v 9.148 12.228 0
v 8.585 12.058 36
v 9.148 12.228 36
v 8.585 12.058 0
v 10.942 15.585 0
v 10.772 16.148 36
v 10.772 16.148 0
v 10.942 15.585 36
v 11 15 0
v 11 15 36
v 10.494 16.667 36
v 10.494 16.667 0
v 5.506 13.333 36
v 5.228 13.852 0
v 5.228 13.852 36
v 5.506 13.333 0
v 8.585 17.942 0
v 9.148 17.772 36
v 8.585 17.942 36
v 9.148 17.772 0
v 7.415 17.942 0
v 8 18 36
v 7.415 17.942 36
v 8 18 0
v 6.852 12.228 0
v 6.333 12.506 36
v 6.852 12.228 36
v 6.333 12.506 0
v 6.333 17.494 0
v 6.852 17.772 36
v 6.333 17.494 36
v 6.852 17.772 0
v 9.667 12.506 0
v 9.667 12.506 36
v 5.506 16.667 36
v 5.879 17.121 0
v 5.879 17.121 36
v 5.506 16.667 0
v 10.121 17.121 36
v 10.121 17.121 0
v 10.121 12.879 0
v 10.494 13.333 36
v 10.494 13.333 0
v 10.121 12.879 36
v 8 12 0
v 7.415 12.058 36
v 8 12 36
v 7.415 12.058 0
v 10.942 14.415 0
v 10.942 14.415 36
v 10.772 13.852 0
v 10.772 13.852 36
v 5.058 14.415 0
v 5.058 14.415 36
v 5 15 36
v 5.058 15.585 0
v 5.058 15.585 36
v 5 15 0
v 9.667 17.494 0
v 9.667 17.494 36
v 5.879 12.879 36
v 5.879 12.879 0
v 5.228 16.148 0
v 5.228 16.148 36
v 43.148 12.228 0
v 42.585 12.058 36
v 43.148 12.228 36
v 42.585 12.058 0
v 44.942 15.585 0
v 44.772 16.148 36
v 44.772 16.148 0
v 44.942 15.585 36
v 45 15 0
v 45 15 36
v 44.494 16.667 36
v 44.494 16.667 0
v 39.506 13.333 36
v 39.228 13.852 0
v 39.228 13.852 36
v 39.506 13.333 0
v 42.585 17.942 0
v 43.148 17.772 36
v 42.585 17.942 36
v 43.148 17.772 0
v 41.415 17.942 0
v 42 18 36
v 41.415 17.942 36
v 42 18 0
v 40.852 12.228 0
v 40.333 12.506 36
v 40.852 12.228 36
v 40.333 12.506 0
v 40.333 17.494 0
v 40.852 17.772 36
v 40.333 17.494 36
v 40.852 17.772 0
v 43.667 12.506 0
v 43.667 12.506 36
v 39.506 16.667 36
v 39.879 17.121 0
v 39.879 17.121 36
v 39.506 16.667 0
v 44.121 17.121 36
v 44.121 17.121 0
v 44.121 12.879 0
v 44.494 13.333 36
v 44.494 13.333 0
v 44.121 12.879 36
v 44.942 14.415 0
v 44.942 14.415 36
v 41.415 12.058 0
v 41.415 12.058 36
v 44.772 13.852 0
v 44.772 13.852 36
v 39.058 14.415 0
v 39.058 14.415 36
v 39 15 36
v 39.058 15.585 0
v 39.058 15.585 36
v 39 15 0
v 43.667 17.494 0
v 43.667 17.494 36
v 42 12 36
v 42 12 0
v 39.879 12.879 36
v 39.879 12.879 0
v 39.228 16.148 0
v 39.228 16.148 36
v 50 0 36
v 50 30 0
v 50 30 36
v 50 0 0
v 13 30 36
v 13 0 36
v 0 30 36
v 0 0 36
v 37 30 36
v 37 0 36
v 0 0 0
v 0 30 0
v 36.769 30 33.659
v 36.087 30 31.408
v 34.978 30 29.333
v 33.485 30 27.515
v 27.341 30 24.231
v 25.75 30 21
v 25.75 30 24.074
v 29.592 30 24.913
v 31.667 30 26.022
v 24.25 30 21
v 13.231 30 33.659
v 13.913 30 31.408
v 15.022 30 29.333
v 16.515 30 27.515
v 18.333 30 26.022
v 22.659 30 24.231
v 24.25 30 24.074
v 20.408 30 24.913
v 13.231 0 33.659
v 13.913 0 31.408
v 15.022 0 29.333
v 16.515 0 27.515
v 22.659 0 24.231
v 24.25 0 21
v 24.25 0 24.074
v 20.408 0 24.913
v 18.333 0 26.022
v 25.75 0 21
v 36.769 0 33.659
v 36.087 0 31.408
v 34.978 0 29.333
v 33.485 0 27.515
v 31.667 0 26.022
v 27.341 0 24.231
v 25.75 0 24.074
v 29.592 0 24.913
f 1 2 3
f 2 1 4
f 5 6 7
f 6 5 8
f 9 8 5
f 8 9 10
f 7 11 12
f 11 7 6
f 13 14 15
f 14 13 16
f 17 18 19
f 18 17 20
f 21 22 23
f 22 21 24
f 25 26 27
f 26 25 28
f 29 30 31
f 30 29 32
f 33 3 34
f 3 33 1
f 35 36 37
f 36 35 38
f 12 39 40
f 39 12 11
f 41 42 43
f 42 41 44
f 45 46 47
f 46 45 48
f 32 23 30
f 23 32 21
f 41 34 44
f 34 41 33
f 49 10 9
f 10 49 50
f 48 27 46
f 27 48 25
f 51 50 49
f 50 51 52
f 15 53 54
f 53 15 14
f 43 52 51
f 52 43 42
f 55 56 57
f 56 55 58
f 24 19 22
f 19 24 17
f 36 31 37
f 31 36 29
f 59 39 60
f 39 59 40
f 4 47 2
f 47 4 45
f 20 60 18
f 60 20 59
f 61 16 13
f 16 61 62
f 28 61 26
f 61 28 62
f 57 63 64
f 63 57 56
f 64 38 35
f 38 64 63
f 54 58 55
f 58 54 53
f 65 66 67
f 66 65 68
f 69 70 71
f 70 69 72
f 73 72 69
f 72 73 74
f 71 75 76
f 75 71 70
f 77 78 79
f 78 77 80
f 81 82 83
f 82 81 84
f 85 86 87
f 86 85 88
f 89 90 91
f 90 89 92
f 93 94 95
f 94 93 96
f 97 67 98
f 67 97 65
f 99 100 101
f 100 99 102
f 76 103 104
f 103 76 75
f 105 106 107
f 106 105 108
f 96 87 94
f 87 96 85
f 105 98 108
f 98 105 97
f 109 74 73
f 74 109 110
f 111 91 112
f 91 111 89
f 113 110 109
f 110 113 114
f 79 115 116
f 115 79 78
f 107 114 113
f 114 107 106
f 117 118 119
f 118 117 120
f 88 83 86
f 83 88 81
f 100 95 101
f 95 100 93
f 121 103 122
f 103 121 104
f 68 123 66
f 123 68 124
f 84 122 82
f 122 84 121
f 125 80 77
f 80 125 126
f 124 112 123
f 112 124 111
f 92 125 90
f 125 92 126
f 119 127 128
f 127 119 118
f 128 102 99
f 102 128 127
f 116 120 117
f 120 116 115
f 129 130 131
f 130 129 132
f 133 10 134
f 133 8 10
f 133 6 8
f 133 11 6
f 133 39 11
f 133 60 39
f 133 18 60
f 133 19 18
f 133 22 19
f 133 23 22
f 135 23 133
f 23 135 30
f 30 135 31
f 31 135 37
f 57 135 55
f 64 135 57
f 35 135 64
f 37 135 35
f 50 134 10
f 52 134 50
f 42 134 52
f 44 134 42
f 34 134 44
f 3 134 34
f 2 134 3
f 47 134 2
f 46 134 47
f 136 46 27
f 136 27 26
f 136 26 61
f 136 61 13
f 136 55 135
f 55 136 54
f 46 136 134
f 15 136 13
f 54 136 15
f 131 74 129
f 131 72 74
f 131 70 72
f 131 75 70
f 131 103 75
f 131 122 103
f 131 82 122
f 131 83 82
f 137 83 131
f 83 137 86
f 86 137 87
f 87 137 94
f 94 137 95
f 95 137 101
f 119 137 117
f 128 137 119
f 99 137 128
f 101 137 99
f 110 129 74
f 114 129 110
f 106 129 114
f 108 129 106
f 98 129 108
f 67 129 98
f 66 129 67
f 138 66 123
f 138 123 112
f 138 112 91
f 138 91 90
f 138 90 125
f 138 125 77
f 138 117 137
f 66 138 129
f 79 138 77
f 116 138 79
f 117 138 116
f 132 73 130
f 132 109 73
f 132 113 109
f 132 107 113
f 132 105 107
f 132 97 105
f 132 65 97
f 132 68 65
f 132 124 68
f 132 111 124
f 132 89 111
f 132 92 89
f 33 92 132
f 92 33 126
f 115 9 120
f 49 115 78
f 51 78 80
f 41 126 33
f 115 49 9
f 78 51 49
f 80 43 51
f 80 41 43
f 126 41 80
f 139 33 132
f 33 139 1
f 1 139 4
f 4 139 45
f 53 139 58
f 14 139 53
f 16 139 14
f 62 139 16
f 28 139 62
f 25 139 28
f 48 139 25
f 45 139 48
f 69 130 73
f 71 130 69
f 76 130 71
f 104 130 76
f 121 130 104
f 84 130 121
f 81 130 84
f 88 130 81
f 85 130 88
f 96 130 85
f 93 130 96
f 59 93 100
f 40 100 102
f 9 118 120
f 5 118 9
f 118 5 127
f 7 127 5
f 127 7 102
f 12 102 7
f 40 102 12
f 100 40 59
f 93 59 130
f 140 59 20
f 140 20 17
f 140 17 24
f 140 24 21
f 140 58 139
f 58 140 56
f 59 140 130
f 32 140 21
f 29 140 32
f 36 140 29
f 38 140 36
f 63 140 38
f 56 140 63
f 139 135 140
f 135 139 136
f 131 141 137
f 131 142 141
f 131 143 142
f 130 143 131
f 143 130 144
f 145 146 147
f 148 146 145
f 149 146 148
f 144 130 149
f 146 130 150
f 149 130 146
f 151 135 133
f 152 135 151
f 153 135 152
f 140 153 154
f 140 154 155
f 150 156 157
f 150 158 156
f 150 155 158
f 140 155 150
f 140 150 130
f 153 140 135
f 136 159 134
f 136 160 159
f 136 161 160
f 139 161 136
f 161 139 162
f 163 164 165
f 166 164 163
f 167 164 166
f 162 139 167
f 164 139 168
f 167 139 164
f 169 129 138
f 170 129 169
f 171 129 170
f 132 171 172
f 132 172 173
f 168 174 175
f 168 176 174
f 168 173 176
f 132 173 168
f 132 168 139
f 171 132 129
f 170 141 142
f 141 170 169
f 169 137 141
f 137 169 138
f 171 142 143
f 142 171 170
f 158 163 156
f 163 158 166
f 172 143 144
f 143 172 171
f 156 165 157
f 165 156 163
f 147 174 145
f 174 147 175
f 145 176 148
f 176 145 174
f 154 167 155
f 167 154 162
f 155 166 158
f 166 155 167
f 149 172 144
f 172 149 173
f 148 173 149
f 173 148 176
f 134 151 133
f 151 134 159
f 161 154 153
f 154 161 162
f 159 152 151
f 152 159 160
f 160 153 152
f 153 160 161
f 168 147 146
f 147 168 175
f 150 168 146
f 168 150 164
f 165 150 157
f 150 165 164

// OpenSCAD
$fn = 32;

// ----------------------------------------------------------------------
// Saddle clamp: split shaft clamp
// ----------------------------------------------------------------------

// --- parameters (mm) ---
blk_l = 50;               // block length, X
blk_w = 30;               // block width, Y
blk_h = 36;               // block height
clamp_r = 12;             // shaft groove radius
hole_r = 3;               // bolt hole radius
hole_m = 8;               // bolt hole margin from the ends
saw_w = 1.5;              // saw kerf width
fit_tol = 0.1;            // tolerance for press fits, mm
free_tol = 0.5;           // tolerance for clearance fits, mm

saw_depth = clamp_r + 3;  // saw kerf depth

difference() {
  cube([blk_l, blk_w, blk_h]);
  translate([blk_l / 2, -1, blk_h])
    rotate([-90, 0, 0])
      cylinder(h = blk_w + 2, r = clamp_r);
  for (sx = [0, 1])
    translate([sx ? blk_l - hole_m : hole_m, blk_w / 2, -1])
      cylinder(r = hole_r, h = blk_h + 2);
  translate([blk_l / 2 - saw_w / 2, -1, blk_h - saw_depth])
    cube([saw_w, blk_w + 2, saw_depth + 1]);
}
